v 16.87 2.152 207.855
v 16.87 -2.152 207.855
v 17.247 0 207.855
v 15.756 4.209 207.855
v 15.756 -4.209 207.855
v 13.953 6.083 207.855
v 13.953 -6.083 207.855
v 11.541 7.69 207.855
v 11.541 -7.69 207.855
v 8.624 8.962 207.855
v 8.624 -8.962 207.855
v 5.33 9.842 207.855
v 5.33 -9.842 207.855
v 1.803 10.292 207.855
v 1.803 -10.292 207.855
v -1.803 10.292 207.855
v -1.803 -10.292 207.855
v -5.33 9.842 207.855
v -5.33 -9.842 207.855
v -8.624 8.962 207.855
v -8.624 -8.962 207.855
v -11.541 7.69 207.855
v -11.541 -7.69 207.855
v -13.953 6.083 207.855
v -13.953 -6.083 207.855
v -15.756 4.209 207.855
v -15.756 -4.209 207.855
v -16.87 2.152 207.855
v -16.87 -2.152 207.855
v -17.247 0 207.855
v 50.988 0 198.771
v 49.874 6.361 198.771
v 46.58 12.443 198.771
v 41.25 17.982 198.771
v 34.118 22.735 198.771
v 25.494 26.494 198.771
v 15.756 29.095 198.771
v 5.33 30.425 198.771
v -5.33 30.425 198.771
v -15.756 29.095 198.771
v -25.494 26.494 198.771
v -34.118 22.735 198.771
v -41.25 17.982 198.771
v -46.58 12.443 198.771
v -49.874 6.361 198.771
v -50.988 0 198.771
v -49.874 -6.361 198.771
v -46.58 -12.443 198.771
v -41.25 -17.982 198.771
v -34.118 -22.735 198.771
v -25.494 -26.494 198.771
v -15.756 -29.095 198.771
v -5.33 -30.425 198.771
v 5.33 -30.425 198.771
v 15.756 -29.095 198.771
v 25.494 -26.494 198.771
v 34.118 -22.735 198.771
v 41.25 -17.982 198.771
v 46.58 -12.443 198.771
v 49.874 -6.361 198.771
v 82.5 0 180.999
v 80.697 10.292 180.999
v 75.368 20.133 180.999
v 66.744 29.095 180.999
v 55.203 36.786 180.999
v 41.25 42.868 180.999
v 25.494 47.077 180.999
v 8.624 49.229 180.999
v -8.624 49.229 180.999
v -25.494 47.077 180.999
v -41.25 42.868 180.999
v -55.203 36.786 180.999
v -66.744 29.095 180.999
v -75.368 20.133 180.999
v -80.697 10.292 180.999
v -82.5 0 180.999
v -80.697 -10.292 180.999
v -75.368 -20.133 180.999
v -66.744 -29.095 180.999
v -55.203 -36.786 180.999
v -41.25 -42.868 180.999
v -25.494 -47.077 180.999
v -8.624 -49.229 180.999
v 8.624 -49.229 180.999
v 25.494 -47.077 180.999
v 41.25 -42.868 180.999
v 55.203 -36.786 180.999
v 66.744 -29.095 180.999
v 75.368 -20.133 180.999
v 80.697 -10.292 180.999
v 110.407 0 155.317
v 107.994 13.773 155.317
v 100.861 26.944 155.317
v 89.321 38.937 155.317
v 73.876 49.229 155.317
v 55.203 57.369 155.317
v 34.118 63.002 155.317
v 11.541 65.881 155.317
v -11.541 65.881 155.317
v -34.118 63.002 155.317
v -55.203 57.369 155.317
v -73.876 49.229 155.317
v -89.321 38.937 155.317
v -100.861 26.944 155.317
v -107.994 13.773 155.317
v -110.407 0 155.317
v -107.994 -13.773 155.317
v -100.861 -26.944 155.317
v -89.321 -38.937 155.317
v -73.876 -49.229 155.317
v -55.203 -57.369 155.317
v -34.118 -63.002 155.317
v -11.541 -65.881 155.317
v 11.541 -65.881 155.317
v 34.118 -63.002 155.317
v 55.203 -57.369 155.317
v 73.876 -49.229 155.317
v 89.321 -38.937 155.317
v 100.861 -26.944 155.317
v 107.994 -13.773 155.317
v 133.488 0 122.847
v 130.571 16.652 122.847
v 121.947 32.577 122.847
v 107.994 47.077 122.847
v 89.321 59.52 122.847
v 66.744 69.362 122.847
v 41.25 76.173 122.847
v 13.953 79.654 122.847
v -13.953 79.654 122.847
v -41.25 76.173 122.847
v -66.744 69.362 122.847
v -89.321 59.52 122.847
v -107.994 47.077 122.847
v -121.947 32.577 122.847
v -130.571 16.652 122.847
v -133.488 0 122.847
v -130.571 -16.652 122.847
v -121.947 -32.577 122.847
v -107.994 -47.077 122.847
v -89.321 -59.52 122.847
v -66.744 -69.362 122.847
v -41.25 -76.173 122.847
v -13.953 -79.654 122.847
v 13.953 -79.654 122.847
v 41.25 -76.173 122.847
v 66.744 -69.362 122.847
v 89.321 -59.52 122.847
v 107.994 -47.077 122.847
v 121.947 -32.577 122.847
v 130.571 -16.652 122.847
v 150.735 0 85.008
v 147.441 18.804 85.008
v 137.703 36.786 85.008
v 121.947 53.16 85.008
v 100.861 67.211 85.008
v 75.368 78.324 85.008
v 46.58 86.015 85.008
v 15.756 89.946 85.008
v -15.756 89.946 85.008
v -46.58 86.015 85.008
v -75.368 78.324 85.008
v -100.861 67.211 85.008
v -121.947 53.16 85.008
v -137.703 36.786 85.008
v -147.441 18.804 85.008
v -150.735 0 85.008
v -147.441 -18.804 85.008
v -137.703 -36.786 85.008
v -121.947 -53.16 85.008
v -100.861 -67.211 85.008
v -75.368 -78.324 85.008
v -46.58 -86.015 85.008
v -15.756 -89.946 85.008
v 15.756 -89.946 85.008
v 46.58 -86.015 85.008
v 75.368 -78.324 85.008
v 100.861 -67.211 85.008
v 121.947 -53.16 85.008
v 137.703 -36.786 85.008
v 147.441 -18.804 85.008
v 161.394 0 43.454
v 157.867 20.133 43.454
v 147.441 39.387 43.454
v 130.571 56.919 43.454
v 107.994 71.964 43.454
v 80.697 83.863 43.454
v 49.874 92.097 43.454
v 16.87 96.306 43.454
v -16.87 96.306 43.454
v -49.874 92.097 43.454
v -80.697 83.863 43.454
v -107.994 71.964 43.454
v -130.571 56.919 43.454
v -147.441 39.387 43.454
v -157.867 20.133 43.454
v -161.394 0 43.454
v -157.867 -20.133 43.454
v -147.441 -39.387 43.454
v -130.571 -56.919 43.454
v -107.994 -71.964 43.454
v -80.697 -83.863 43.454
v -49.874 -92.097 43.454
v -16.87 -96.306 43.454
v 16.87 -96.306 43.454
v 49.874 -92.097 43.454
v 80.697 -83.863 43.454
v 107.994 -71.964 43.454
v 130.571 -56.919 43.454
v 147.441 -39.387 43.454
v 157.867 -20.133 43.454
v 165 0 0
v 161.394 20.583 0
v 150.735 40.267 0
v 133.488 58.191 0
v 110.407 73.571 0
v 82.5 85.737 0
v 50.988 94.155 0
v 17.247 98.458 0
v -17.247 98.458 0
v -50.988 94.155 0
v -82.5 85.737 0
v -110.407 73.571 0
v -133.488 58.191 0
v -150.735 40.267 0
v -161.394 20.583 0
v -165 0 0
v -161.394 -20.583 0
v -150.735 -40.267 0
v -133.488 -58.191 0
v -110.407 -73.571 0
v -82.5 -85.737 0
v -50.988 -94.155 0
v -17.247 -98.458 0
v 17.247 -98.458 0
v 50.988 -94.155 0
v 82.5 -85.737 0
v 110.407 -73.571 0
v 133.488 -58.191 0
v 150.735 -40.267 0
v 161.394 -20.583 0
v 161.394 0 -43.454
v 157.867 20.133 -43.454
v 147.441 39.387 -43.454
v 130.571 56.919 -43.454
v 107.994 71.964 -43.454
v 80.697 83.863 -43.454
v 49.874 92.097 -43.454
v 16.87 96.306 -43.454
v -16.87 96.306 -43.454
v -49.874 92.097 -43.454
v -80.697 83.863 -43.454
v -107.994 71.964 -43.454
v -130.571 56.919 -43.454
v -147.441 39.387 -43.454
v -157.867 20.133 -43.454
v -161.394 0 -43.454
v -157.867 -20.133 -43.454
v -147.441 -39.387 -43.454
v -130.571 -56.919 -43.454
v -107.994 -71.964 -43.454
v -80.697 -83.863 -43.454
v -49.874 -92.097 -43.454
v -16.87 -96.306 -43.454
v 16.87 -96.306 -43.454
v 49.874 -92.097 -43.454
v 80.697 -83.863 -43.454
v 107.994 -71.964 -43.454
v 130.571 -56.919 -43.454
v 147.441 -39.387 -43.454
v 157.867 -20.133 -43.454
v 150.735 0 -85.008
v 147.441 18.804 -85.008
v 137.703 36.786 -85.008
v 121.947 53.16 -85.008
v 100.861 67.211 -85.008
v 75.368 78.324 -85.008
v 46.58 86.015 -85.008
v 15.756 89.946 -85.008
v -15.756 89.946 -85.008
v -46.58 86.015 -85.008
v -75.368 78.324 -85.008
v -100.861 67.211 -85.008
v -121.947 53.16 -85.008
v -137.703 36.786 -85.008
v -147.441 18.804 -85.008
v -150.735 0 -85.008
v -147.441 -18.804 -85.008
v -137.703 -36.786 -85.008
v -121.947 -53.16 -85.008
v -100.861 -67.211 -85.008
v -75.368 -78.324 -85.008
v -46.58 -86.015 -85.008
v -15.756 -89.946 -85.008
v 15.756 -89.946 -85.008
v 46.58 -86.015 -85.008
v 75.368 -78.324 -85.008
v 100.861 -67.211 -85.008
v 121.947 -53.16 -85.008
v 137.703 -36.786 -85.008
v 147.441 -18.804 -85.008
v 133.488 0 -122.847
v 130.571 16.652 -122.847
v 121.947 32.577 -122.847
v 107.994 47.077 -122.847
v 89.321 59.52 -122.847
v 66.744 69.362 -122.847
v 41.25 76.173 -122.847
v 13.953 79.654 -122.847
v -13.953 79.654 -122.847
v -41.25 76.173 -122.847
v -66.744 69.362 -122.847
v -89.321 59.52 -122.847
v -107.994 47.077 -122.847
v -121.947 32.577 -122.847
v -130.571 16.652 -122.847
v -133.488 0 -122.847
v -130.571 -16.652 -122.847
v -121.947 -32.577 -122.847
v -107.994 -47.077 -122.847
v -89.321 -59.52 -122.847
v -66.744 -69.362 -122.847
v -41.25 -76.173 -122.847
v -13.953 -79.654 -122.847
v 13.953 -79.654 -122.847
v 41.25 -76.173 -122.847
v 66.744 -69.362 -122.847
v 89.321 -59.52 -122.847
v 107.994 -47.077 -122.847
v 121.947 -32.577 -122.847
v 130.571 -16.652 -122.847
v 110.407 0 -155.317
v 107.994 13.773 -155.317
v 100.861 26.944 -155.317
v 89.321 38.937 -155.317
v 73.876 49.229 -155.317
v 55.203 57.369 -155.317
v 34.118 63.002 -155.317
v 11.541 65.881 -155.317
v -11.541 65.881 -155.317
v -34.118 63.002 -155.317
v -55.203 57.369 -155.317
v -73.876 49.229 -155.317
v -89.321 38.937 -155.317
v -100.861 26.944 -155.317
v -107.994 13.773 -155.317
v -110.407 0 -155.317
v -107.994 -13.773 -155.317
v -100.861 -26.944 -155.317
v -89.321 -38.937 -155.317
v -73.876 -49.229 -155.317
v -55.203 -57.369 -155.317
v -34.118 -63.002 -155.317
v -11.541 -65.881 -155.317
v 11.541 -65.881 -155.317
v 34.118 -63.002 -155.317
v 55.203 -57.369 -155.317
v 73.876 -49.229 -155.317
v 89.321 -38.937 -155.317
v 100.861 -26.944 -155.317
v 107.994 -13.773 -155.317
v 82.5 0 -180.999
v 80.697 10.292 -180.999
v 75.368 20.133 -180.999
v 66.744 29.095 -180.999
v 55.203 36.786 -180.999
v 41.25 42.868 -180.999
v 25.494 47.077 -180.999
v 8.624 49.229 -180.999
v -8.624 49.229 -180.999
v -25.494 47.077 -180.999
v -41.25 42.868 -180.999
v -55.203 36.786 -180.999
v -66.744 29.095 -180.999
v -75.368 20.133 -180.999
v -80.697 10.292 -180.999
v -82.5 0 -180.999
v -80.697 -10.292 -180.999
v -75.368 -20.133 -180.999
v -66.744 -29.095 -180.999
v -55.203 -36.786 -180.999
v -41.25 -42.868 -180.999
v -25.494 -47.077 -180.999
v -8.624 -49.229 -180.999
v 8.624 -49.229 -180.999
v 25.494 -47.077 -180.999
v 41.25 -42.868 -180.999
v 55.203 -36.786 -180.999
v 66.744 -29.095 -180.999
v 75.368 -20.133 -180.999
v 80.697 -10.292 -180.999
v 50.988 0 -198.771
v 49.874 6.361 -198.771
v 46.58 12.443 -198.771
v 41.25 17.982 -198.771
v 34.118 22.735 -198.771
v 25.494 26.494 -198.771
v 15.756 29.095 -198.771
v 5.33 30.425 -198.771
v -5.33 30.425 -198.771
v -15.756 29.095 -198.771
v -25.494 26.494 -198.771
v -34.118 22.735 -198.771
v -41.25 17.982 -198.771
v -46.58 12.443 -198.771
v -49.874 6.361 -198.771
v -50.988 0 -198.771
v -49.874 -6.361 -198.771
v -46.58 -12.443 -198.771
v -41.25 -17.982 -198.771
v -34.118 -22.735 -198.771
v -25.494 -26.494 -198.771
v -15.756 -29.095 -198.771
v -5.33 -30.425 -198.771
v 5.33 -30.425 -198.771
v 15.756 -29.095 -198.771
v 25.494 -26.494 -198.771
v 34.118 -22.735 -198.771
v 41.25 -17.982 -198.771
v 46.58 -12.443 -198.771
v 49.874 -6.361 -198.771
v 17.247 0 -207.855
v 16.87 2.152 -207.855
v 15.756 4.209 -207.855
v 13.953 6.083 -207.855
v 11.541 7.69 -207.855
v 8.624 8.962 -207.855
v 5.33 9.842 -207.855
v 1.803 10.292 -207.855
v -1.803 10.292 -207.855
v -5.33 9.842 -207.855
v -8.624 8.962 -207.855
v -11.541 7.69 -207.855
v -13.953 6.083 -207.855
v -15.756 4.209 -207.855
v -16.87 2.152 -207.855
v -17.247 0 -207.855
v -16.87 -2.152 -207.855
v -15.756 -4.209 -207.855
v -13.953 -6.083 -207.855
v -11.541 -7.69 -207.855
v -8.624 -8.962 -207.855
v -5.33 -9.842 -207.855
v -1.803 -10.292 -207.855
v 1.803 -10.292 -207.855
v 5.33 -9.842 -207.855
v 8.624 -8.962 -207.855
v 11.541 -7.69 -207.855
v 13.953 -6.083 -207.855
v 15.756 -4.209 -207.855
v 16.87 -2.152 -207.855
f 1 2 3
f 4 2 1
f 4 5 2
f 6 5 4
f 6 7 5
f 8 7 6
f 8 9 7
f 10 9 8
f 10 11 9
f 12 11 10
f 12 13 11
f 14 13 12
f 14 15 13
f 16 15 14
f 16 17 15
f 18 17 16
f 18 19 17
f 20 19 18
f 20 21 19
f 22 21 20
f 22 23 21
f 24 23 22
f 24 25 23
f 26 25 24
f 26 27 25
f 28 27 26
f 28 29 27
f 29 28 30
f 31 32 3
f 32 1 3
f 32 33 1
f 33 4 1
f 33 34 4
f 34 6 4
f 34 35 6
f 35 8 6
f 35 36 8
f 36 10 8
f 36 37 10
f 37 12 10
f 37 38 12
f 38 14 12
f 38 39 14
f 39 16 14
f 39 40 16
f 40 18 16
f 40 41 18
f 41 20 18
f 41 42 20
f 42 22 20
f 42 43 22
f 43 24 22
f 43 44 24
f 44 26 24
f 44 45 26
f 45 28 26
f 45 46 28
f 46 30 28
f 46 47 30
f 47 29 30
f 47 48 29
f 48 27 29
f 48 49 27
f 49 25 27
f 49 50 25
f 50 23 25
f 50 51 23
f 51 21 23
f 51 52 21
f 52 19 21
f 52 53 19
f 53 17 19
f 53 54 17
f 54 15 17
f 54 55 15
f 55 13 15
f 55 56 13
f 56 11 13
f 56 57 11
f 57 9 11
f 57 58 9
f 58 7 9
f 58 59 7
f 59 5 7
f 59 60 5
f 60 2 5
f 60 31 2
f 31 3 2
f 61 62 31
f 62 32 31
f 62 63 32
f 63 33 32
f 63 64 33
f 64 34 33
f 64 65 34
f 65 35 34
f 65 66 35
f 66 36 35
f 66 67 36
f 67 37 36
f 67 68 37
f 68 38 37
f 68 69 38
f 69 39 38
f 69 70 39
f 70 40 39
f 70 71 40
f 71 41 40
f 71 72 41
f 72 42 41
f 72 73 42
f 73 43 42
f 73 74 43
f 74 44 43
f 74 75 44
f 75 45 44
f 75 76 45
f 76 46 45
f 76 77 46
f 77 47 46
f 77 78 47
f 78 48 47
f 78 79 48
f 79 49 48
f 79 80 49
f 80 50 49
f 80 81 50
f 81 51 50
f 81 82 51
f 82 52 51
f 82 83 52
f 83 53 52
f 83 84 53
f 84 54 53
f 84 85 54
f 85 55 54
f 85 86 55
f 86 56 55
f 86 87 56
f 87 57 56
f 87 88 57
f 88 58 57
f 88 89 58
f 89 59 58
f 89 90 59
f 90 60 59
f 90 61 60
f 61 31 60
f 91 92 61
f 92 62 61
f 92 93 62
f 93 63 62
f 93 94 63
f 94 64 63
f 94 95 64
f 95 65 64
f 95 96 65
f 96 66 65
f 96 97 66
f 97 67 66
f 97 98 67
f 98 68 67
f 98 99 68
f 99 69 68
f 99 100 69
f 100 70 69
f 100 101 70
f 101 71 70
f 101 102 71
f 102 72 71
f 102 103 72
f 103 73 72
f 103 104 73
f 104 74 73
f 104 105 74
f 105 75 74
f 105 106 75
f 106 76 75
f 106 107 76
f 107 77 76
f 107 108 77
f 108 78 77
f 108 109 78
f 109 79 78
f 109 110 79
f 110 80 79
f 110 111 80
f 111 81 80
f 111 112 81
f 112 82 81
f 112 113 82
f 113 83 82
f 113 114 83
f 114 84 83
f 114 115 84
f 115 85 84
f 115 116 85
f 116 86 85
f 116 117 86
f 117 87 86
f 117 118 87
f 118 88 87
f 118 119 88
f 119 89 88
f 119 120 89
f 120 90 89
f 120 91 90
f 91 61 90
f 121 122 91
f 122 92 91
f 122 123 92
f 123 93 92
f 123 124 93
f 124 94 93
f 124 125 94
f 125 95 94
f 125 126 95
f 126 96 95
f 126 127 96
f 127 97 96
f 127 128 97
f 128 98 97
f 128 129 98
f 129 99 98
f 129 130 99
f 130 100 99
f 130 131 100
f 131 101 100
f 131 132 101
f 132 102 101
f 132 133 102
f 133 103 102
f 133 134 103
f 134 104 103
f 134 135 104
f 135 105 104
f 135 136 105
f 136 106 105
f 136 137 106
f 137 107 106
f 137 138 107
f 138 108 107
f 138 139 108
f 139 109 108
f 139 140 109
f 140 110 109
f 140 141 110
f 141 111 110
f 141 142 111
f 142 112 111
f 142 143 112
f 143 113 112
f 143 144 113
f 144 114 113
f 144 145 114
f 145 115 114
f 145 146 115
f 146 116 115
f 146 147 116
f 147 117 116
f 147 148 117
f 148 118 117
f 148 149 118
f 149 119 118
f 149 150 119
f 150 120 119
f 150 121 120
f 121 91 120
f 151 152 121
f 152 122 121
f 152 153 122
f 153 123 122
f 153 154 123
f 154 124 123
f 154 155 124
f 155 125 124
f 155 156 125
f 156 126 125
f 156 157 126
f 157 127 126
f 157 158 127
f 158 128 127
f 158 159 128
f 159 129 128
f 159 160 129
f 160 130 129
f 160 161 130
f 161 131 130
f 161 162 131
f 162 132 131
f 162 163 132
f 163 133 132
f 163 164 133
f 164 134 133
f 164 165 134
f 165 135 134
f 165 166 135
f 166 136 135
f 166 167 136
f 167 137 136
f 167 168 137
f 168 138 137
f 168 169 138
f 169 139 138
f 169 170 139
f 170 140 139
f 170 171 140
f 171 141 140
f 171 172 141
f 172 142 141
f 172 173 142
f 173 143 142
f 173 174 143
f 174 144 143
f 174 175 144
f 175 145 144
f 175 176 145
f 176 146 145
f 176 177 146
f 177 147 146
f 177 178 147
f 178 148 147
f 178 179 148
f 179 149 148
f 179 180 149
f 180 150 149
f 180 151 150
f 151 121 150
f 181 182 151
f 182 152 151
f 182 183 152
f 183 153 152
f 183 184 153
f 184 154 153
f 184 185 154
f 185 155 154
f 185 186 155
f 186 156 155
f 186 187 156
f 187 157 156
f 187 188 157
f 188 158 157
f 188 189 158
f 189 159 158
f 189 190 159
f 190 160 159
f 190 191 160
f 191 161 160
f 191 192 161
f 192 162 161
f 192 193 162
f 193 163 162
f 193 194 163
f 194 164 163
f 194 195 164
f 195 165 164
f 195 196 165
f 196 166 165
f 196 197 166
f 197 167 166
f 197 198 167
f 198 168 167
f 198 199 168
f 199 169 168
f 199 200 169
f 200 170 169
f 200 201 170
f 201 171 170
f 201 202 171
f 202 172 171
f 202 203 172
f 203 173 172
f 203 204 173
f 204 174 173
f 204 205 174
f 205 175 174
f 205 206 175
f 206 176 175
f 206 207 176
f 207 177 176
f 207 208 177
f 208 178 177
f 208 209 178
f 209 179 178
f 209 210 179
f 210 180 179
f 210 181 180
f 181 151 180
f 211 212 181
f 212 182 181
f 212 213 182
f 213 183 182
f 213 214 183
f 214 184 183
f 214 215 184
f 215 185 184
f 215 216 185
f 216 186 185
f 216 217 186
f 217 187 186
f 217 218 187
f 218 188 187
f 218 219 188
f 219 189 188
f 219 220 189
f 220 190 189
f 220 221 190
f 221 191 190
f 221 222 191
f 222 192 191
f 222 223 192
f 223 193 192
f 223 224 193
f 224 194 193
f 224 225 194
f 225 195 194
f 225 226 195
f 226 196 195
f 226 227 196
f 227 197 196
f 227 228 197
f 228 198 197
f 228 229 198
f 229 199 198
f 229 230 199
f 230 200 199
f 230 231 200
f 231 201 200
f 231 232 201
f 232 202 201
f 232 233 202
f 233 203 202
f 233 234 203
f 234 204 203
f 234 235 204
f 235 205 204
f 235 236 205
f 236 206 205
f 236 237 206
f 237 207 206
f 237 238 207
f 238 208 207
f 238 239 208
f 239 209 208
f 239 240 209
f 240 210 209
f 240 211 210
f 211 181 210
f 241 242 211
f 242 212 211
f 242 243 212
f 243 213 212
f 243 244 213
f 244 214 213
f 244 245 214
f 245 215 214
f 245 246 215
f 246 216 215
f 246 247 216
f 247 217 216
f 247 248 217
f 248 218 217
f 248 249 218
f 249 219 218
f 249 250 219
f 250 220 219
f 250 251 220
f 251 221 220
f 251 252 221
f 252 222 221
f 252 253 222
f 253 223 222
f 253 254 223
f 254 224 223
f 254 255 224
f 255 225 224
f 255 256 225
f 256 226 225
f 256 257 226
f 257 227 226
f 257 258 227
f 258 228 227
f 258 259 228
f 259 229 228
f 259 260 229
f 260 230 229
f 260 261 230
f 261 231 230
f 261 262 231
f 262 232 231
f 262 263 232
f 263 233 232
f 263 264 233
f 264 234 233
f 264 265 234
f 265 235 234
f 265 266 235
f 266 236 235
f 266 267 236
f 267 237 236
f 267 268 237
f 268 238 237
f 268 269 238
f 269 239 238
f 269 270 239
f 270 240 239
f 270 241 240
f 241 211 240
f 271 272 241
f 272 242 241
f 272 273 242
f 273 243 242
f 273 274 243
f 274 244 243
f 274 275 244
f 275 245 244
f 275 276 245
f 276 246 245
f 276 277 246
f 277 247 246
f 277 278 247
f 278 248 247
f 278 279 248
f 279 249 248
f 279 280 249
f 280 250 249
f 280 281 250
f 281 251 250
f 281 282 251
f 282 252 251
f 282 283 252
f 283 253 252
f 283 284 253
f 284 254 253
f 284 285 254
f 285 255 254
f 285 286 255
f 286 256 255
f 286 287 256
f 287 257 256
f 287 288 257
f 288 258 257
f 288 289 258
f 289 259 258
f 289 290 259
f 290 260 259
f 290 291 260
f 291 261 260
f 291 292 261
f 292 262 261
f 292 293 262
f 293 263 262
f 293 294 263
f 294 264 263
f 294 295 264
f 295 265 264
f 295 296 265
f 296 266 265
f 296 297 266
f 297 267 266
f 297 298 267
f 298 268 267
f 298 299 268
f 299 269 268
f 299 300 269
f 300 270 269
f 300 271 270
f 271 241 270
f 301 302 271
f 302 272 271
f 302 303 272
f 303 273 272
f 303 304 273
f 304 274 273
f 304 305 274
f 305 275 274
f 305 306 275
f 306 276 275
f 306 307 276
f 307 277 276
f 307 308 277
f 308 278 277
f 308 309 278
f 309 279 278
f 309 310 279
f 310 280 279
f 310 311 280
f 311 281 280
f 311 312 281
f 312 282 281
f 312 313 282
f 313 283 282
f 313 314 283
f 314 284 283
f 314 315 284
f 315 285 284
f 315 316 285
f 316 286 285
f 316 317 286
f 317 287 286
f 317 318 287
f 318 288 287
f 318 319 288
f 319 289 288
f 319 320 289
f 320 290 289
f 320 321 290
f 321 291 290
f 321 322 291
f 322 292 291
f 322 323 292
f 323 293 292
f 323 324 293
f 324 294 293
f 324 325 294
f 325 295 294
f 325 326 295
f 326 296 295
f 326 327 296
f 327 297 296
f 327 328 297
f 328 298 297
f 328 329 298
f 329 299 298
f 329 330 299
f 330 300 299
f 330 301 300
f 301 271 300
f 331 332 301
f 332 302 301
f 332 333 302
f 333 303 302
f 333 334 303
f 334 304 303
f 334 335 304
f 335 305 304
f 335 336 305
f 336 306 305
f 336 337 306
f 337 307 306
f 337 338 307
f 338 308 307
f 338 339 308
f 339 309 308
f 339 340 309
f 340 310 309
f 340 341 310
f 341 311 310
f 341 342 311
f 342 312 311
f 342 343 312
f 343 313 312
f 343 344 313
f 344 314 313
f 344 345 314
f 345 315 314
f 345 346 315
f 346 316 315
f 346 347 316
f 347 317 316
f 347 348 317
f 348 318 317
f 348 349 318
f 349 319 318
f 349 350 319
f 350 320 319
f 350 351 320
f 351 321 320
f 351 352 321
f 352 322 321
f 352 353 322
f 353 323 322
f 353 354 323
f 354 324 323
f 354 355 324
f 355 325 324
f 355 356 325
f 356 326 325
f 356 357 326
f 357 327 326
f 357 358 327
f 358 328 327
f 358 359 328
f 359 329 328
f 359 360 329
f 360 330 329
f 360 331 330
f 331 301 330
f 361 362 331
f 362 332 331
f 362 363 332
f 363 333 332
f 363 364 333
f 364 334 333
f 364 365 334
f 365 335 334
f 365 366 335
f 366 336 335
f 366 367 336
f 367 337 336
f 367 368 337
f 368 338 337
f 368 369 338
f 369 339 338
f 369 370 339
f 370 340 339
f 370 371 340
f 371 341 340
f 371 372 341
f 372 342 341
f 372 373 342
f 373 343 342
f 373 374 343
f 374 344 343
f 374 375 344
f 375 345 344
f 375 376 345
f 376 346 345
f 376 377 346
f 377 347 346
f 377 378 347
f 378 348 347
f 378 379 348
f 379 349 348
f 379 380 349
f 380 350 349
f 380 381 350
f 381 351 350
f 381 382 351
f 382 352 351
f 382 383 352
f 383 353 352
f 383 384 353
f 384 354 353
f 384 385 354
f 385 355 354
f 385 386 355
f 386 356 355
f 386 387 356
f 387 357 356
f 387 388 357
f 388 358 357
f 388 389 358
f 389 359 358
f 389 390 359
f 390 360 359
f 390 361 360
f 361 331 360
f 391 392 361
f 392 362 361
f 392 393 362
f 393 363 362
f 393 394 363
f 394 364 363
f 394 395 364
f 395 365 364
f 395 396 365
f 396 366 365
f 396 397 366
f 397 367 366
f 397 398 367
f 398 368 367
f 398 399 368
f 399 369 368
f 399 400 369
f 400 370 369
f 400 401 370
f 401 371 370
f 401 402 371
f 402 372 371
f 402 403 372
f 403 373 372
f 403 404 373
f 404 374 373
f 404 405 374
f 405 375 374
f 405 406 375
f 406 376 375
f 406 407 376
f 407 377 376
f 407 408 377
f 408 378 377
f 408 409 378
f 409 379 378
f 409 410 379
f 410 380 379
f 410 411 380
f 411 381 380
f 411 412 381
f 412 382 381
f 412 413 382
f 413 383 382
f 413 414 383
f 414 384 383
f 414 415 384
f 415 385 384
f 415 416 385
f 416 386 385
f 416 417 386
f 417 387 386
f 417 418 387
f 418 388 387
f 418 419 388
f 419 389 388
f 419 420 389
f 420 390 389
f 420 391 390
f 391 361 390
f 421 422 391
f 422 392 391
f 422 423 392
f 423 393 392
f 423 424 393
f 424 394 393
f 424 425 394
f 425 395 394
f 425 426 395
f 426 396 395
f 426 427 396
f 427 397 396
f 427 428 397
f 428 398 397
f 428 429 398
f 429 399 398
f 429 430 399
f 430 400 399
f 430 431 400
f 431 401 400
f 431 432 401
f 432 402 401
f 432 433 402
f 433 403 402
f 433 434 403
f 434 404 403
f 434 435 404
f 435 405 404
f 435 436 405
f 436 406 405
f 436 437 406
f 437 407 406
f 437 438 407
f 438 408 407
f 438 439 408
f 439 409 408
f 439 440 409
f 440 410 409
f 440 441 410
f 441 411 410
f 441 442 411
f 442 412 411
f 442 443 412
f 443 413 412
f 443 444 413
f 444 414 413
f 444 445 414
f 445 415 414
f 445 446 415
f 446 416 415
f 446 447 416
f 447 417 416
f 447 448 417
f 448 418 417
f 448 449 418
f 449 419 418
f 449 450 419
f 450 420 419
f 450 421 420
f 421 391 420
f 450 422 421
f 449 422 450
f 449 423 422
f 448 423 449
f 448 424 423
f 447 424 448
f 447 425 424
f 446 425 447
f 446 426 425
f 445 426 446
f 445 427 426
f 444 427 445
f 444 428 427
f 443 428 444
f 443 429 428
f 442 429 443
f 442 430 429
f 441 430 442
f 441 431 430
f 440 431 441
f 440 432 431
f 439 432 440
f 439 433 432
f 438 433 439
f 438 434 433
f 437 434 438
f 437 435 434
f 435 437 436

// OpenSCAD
// Generated by SolidPython 1.0.1 on 2020-07-29 00:46:52


scale(v = [15, 9, 19]) {
	sphere(r = 11);
}
/***********************************************
*********      SolidPython code:      **********
************************************************
 
# import packages: SolidPython
from solid import *
from solid.utils import *
from itertools import chain, combinations, permutations


class Resize:

    def __init__(self, scad_file):
        self.scad_file = scad_file
        #self.scad_file = import_scad(scad_file)
        # cone/cylinder param:
        self.r1 = 0
        self.r2 = 0
        self.h = 0
        # rectangular prism param:
        self.w = 0
        self.l = 0
        # ellipse param:
        self.r = 0

    # import OpenScad code (file name corresponds to shape)


    # classify shape + parameters
    def assign(self, param1, param2, param3):
        if self.scad_file == 'cone.scad':
            self.r1 = param1
            self.r2 = param2
            self.h = param3
        elif self.scad_file == 'cylinder.scad':
            self.r1 = param1
            self.r2 = param2
            self.h = param3
        elif self.scad_file == 'rectangularPrism.scad':
            self.h = param1
            self.l = param2
            self.w = param3
        else:
            self.r = param1
            self.h = param2

    # resize parameters
    def iterate(self):
        x = range(3, 20, 2)
        i = 1
        if self.scad_file == 'cone.scad':
            tempList = list(permutations(x, 2))
            for temp in tempList:
                param1 = temp[0]
                param2 = temp[1]
                filepath = 'produced_scad_files/' + 'cone' + str(param1) + '_' + str(param2) + '_' + '.scad'
                scad_render_to_file(cylinder(h=param1, r1=param2, r2=0), filepath)

        elif self.scad_file == 'cylinder.scad':
            tempList = list(permutations(x, 3))
            for temp in tempList:
                param1 = temp[0]
                param2 = temp[1]
                filepath = 'produced_scad_files/' + 'cylinder' + str(param1) + '_' + str(param2) + '_' + '.scad'
                scad_render_to_file(cylinder(h=param1, r1=param2, r2=param2), filepath)

        elif self.scad_file == 'rectangularPrism.scad':
            tempList = list(permutations(x, 3))
            for temp in tempList:
                param1 = temp[0]
                param2 = temp[1]
                param3 = temp[2]
                filepath = 'produced_scad_files/' + 'rectangularPrism' + str(param1) + '_' + str(param2) + '_' + str(
                    param3) + '.scad'
                scad_render_to_file(cube(size=(param1, param2, param3)), filepath)

        elif self.scad_file == 'ellipse.scad':
            tempList = list(permutations(x, 4))
            for temp in tempList:
                param1 = temp[0]
                param2 = temp[1]
                param3 = temp[2]
                param4 = temp[3]
                filepath = 'produced_scad_files/' + 'ellipse' + str(param1) + '_' + str(param2) + '_' + str(param3) + '_' + str(param4) + '.scad'
                scad_render_to_file(scale([param1, param2, param3])(sphere(r=param4)), filepath)

    def render_to_scadfile(self):
        scad_render_to_file(scad, 'example.scad') 
 
************************************************/
